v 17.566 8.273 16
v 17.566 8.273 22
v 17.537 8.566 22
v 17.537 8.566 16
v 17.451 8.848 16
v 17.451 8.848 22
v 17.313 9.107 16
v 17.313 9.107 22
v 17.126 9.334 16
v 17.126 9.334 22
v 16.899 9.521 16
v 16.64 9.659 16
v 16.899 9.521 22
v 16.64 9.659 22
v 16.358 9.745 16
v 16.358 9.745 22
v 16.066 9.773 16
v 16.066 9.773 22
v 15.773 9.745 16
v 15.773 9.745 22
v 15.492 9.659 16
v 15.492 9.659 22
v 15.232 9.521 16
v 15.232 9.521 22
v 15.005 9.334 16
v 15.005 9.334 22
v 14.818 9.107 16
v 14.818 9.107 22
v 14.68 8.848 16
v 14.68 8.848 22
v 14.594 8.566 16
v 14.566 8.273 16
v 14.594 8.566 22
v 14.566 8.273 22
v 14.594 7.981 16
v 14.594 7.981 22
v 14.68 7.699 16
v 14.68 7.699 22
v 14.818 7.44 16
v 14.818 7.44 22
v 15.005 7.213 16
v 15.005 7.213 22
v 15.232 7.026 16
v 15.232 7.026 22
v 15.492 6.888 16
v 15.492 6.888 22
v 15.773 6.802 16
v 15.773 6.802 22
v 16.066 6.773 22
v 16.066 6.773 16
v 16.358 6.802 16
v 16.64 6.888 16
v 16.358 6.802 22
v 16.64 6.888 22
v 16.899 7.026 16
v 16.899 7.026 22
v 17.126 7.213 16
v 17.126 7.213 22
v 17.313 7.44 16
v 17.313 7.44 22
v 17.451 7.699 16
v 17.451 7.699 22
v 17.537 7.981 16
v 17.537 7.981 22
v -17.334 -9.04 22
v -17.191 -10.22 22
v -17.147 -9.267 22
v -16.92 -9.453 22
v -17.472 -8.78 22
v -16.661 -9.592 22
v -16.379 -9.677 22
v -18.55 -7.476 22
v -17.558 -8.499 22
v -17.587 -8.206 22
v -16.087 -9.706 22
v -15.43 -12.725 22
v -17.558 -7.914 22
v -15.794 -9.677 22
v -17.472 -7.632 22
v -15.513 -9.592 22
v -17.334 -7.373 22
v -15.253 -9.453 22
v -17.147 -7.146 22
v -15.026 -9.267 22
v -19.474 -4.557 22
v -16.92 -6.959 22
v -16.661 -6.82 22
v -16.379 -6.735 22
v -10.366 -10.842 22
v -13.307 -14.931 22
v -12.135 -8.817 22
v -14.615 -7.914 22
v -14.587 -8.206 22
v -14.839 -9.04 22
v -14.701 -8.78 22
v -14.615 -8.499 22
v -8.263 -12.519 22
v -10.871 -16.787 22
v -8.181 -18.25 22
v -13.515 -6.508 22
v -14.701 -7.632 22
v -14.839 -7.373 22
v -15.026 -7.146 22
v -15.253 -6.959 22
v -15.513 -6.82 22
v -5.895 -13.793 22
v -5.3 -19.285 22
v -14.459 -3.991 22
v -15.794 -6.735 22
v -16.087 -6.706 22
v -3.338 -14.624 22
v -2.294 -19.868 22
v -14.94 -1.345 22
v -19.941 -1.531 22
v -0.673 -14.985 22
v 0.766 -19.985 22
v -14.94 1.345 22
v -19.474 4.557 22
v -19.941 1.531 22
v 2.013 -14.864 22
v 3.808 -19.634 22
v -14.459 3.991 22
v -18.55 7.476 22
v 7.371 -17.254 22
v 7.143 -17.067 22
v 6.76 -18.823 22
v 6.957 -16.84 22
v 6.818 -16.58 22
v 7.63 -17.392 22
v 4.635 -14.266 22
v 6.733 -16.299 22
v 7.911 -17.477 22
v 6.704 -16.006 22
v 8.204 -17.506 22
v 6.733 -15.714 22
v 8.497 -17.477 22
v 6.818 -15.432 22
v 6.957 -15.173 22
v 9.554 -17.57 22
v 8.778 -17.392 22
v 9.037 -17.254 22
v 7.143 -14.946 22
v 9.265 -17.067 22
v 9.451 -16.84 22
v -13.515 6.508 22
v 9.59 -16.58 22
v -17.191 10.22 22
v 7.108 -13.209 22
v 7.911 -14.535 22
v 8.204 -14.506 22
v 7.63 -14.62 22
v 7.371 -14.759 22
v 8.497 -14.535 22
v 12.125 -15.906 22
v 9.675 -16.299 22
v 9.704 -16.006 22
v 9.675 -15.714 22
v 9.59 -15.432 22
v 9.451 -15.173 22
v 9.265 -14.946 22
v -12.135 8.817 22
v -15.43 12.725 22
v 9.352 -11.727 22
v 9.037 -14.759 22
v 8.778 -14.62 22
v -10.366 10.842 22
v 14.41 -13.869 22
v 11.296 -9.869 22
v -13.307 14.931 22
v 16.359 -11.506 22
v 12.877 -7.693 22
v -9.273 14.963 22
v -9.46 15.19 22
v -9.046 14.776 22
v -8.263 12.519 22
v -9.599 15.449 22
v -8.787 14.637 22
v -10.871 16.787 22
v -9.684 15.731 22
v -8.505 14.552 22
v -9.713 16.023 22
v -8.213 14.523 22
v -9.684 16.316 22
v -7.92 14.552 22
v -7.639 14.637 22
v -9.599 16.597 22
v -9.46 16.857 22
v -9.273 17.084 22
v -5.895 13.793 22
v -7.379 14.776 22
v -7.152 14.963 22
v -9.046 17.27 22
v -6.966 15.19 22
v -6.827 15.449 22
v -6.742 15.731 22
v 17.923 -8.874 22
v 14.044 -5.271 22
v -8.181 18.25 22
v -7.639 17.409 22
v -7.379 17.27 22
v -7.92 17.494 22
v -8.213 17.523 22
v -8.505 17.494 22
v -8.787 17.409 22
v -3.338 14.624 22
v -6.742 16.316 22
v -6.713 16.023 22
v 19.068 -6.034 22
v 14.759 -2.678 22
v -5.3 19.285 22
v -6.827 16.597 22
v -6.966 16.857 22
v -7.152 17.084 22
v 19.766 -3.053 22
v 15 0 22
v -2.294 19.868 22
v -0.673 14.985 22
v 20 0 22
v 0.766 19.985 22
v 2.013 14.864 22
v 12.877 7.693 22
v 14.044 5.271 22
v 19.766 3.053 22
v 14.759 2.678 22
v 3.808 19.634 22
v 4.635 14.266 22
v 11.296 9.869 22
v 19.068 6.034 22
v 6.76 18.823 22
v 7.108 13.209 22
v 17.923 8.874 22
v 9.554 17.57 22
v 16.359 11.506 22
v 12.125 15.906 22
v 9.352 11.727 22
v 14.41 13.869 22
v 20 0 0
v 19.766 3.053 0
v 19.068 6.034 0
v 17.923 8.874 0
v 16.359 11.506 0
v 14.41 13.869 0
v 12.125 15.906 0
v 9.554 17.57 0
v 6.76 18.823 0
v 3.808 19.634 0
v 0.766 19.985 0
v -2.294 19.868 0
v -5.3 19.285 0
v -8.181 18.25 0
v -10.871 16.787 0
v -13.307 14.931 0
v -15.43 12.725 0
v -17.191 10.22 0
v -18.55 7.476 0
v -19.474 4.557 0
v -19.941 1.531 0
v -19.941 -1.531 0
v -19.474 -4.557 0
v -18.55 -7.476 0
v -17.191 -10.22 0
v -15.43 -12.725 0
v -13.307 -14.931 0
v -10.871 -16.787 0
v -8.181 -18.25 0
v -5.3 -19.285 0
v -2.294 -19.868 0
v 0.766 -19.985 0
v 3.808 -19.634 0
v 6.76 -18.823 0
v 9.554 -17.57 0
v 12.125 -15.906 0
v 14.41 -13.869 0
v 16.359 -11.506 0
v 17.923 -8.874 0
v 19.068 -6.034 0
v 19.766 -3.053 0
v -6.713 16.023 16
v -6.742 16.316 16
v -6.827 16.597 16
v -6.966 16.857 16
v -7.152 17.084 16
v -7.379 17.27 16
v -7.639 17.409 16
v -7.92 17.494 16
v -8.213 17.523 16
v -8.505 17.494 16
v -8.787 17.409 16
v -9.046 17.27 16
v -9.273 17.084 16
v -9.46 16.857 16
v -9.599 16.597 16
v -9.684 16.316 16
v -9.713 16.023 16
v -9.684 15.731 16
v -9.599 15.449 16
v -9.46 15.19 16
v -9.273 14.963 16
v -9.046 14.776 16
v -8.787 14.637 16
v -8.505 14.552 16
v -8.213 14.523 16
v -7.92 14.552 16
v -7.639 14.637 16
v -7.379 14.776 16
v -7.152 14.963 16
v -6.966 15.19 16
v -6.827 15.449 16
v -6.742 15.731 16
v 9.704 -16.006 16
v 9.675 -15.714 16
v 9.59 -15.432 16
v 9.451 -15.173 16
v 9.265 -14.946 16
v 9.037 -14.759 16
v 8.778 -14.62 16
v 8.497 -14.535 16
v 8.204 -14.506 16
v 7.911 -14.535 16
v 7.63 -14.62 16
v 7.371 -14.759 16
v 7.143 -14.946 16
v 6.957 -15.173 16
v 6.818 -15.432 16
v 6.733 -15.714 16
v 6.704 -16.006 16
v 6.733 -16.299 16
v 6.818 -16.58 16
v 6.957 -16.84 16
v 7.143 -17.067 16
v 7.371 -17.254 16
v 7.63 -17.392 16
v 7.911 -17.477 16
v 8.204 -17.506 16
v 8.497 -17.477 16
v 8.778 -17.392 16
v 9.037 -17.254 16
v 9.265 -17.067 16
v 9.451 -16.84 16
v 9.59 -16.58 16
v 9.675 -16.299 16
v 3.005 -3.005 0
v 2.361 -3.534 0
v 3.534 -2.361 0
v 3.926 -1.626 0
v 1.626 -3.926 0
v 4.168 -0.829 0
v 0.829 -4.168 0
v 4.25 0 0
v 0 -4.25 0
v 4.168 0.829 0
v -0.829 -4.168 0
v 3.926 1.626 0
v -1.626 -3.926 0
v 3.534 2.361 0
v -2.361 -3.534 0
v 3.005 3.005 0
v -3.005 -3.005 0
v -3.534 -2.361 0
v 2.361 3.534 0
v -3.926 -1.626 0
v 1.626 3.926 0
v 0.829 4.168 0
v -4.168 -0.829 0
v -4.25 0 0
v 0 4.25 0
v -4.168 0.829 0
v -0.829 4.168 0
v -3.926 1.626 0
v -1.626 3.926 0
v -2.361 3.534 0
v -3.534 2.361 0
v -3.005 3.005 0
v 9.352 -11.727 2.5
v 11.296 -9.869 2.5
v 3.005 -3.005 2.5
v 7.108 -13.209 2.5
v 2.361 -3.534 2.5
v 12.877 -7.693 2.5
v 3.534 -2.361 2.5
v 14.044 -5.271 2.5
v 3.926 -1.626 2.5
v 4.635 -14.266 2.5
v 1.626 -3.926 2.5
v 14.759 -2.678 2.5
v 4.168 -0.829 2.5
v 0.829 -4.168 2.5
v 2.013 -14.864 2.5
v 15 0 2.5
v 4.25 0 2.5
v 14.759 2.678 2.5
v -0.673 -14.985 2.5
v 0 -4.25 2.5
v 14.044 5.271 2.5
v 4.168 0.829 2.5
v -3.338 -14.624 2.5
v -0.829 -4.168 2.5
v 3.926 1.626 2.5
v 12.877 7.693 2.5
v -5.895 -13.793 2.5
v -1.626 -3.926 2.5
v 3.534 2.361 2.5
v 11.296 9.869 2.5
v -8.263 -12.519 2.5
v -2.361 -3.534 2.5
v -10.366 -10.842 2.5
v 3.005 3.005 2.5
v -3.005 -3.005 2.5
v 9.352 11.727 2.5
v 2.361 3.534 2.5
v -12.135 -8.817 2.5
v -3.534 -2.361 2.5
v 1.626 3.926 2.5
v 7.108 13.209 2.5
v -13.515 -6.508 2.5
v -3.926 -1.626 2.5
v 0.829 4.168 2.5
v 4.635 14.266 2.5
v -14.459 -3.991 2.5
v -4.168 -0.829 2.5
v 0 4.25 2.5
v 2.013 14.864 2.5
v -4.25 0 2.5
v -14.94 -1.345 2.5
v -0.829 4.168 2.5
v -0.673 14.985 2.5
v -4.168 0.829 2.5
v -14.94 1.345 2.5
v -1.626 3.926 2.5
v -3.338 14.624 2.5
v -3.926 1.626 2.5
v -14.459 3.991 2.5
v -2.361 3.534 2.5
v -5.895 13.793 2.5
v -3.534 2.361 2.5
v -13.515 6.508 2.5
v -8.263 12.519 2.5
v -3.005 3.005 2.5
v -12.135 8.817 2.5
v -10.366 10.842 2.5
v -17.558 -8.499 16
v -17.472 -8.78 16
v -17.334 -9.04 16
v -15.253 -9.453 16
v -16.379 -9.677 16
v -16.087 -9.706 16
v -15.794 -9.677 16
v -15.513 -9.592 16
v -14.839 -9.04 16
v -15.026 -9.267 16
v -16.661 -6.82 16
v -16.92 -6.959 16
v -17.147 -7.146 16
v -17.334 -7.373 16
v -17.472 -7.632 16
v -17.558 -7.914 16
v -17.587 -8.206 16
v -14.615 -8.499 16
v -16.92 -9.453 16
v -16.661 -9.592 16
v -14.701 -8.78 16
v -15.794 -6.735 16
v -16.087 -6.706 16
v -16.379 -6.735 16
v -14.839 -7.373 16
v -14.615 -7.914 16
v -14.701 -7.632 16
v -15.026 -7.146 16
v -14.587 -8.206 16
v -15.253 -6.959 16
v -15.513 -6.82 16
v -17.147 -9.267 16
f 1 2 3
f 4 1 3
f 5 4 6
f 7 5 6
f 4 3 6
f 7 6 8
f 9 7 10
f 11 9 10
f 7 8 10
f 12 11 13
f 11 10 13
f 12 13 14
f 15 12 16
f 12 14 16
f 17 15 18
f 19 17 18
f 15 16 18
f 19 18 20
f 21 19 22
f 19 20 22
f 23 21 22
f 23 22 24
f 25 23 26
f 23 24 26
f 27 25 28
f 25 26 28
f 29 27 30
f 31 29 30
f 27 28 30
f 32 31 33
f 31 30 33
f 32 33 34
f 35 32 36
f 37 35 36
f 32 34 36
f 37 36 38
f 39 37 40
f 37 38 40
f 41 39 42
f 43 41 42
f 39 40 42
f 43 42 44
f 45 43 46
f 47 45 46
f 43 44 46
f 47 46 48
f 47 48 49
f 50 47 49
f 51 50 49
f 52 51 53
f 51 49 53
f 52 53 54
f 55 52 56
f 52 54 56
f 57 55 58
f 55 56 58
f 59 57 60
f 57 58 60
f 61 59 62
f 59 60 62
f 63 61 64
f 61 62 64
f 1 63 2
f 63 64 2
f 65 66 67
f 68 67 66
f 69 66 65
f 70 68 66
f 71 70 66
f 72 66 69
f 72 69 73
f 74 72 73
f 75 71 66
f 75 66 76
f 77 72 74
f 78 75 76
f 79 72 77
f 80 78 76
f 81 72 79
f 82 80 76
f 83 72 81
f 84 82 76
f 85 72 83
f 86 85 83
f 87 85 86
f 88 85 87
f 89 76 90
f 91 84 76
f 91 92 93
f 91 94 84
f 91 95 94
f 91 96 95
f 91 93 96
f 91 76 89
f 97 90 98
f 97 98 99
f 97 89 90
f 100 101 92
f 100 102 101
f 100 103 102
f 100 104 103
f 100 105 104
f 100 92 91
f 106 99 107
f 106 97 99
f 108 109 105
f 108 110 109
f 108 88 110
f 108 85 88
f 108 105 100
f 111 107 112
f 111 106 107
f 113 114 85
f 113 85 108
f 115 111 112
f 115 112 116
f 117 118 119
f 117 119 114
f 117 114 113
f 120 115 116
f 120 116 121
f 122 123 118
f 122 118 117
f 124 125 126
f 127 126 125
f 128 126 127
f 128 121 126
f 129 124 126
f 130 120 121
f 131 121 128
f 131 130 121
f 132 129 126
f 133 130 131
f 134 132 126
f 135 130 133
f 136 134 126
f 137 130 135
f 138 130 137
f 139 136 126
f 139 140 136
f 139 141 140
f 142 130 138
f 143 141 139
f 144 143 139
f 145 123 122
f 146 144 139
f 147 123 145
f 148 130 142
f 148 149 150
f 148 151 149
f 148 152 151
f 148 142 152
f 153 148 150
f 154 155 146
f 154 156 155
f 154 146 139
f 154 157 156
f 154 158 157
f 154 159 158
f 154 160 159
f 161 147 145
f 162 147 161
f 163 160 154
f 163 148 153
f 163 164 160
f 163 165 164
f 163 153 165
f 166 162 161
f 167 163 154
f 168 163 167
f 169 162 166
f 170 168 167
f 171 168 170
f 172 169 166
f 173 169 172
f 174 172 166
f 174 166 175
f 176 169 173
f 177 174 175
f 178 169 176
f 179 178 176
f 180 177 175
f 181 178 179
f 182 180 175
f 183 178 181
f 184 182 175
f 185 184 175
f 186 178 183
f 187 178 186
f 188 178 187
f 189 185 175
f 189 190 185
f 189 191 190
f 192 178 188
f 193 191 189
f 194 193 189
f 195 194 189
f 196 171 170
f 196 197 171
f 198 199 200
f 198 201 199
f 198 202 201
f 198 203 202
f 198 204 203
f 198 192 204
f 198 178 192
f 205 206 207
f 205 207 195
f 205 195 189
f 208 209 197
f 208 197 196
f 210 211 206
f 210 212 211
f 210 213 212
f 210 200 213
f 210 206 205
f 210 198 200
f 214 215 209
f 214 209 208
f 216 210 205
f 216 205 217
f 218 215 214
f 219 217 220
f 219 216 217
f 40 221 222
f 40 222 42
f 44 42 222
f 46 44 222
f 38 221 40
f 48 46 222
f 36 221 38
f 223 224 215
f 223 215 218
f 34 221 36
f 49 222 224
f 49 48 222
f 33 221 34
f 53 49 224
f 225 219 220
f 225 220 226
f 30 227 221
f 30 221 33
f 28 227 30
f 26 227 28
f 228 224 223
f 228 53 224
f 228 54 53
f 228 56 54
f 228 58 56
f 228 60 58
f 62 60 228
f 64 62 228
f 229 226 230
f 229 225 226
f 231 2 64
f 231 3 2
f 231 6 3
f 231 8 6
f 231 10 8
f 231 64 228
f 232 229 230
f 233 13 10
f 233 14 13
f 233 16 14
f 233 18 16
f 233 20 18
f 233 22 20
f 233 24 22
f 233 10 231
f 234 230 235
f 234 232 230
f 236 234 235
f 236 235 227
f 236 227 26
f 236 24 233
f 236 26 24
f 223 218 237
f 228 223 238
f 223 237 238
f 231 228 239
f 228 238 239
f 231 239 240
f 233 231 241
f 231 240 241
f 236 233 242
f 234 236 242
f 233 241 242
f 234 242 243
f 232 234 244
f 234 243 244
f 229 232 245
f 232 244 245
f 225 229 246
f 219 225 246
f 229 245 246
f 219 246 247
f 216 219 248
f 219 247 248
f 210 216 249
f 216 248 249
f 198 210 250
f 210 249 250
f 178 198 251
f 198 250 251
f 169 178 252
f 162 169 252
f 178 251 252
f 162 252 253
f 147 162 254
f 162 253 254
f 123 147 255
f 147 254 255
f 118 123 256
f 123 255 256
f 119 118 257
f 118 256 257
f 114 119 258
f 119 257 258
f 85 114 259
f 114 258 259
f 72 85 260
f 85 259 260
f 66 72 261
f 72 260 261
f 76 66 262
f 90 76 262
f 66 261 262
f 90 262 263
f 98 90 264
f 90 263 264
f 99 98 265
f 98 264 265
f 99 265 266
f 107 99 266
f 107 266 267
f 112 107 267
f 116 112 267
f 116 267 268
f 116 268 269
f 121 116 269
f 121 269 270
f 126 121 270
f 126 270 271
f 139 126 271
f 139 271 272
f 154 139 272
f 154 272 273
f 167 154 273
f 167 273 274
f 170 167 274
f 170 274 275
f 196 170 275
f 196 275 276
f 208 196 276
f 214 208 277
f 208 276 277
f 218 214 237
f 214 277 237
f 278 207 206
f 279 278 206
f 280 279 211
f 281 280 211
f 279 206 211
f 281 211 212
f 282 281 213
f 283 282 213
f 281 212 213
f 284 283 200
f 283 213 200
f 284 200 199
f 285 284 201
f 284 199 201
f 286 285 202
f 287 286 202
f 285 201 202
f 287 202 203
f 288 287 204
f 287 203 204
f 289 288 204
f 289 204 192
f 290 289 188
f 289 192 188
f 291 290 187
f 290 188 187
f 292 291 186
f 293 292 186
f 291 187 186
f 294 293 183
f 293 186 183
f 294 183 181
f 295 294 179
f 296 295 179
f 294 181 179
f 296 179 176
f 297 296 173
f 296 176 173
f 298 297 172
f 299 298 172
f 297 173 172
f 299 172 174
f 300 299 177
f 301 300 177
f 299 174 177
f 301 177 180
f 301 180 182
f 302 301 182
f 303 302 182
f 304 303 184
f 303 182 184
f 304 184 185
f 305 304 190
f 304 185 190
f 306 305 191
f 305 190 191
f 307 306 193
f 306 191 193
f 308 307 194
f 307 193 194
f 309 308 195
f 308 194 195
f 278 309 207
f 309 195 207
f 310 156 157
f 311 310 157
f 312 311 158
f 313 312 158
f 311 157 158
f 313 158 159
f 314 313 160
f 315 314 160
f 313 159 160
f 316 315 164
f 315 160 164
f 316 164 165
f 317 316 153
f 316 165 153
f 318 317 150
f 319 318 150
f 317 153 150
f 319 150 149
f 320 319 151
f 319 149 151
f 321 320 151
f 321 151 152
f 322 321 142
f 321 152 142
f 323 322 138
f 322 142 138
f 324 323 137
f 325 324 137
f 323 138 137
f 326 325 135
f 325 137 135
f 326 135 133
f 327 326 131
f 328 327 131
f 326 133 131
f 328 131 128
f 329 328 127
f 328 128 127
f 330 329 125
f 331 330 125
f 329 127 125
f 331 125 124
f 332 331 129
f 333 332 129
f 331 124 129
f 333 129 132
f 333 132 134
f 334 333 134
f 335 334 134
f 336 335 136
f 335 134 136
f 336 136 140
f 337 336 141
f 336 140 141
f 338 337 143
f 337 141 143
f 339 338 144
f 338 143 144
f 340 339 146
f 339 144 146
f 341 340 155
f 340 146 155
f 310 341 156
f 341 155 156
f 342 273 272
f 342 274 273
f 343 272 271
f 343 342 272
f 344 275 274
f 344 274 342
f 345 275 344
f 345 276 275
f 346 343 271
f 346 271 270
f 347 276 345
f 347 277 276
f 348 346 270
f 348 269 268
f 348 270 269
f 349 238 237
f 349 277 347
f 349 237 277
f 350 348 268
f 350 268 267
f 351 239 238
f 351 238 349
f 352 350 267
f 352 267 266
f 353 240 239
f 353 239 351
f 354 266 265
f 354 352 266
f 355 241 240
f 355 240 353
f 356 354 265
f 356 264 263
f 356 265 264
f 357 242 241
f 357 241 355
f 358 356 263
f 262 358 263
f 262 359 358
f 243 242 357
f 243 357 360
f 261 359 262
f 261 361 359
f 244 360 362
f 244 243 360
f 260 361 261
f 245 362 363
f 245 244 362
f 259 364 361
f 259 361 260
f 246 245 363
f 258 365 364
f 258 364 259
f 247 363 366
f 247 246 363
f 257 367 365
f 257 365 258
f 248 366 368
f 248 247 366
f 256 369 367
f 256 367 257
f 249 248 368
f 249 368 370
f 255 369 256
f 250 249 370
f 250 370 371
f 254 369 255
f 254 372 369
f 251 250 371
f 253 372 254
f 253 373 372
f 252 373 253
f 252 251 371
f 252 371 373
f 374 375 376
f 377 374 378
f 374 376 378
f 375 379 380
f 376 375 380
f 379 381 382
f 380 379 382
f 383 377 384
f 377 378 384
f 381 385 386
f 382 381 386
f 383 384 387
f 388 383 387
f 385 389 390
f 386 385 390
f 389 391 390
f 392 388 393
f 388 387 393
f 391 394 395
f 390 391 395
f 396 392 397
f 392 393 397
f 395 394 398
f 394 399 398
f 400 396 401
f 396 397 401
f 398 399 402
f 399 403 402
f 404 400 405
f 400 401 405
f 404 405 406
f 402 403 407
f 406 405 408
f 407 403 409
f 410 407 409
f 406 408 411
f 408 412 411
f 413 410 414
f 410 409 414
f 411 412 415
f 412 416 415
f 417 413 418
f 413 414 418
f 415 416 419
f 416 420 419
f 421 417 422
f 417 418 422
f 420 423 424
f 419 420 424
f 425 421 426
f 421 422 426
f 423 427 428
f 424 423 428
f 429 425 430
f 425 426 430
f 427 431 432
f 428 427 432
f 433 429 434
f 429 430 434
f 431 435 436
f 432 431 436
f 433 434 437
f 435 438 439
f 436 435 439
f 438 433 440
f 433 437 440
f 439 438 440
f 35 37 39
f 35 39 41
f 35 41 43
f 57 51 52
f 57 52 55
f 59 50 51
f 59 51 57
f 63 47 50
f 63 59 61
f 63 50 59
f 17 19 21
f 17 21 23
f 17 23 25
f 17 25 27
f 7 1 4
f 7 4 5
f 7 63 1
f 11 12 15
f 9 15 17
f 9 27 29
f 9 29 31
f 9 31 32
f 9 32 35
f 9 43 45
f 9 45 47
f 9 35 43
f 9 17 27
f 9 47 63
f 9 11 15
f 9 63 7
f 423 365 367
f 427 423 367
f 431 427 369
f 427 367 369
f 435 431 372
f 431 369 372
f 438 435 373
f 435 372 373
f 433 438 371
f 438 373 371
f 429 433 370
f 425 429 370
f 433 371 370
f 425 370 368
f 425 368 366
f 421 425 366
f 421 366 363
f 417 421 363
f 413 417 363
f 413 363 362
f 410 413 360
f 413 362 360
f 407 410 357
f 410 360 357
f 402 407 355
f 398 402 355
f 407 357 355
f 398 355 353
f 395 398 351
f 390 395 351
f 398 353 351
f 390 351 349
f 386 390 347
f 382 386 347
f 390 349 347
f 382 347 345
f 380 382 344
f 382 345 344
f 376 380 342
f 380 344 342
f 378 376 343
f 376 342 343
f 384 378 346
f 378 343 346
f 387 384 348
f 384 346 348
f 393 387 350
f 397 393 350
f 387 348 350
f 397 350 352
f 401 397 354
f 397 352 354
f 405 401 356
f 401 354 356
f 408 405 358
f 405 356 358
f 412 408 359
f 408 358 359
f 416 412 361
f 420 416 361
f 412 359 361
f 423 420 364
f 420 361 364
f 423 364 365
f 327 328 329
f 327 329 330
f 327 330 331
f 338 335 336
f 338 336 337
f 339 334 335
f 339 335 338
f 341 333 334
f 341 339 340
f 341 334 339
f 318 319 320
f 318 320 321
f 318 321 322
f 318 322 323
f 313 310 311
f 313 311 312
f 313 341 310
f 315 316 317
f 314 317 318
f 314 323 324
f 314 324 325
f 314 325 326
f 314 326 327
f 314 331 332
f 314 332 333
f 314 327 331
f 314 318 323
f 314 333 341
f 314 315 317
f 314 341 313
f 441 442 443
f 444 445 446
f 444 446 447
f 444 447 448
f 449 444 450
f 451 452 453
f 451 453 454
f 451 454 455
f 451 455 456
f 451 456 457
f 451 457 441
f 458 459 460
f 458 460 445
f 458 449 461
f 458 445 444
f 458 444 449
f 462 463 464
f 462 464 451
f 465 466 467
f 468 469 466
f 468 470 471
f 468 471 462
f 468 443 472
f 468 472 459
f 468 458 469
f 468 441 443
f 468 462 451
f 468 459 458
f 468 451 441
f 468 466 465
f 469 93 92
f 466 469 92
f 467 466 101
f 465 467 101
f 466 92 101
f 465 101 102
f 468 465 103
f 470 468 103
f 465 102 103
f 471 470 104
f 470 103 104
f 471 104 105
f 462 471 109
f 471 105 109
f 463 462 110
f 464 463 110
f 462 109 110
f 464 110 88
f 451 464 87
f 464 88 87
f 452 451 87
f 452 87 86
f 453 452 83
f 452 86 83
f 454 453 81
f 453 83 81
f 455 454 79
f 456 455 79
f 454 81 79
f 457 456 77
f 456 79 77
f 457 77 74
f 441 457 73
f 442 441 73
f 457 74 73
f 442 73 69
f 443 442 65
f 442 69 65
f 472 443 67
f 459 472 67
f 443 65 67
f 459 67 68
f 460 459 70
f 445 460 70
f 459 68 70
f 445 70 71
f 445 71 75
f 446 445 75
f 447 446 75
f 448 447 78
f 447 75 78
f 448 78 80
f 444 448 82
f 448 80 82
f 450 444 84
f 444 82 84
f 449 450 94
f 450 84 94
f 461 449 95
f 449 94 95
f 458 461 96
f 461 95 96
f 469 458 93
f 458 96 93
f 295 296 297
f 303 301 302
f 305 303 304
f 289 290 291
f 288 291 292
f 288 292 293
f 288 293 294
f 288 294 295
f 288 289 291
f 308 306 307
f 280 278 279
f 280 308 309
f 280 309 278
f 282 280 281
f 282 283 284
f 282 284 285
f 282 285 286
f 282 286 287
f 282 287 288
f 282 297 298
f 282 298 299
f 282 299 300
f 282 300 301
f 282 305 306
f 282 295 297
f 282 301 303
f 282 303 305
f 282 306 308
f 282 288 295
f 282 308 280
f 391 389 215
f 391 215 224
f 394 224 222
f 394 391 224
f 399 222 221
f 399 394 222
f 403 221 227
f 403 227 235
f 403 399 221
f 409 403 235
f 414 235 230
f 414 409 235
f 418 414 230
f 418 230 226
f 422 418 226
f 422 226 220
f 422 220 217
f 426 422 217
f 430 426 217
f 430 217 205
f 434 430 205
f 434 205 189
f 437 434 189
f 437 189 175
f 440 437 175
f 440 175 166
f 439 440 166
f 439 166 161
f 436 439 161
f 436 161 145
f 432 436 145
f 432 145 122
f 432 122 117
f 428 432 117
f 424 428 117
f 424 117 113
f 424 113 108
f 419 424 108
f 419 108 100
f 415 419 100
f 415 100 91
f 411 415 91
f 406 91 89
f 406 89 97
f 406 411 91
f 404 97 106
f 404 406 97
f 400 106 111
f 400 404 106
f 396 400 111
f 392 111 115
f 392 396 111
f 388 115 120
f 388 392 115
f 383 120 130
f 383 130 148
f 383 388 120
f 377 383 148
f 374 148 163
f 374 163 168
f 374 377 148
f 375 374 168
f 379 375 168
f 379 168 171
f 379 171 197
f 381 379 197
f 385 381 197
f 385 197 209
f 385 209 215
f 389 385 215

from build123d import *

# Parameters (mm, degrees)
ESQUISSE1_R             = 20
ESQUISSE1_R_2           = 15
BOSS_EXTRU_1_DEPTH      = 22
ESQUISSE5_R             = 15
BOSS_EXTRU_3_DEPTH      = 2.5
ESQUISSE12_R            = 4.25
ENL_V_MAT_EXTRU_2_DEPTH = 2.5
ESQUISSE13_R            = 1.5
ENL_V_MAT_EXTRU_3_DEPTH = 6


with BuildPart() as part:
    # Esquisse1 → Boss.-Extru.1 (new body)
    with BuildSketch(Plane.XY):
        Circle(ESQUISSE1_R)
        Circle(ESQUISSE1_R_2, mode=Mode.SUBTRACT)
    extrude(amount=BOSS_EXTRU_1_DEPTH)

    # Esquisse5 → Boss.-Extru.3 (add)
    with BuildSketch(Plane(origin=(0, 0, 0), x_dir=(-1, 0, 0), z_dir=(0, 0, -1))):
        Circle(ESQUISSE5_R)
    extrude(amount=-BOSS_EXTRU_3_DEPTH)

    # Esquisse12 → Enlèv. mat.-Extru.2 (cut)
    with BuildSketch(Plane(origin=(0, 0, 0), x_dir=(-1, 0, 0), z_dir=(0, 0, -1))):
        Circle(ESQUISSE12_R)
    extrude(amount=-ENL_V_MAT_EXTRU_2_DEPTH, mode=Mode.SUBTRACT)

    # Esquisse13 → Enlèv. mat.-Extru.3 (cut)
    with BuildSketch(Plane.XY.offset(22)):
        with Locations((16.065617012, 8.273487748)):
            Circle(ESQUISSE13_R)
        with Locations((8.204066222, -16.006302524)):
            Circle(ESQUISSE13_R)
        with Locations((-16.086643669, -8.206225502)):
            Circle(ESQUISSE13_R)
        with Locations((-8.212754961, 16.023254434)):
            Circle(ESQUISSE13_R)
    extrude(amount=-ENL_V_MAT_EXTRU_3_DEPTH, mode=Mode.SUBTRACT)


solid = part.part
